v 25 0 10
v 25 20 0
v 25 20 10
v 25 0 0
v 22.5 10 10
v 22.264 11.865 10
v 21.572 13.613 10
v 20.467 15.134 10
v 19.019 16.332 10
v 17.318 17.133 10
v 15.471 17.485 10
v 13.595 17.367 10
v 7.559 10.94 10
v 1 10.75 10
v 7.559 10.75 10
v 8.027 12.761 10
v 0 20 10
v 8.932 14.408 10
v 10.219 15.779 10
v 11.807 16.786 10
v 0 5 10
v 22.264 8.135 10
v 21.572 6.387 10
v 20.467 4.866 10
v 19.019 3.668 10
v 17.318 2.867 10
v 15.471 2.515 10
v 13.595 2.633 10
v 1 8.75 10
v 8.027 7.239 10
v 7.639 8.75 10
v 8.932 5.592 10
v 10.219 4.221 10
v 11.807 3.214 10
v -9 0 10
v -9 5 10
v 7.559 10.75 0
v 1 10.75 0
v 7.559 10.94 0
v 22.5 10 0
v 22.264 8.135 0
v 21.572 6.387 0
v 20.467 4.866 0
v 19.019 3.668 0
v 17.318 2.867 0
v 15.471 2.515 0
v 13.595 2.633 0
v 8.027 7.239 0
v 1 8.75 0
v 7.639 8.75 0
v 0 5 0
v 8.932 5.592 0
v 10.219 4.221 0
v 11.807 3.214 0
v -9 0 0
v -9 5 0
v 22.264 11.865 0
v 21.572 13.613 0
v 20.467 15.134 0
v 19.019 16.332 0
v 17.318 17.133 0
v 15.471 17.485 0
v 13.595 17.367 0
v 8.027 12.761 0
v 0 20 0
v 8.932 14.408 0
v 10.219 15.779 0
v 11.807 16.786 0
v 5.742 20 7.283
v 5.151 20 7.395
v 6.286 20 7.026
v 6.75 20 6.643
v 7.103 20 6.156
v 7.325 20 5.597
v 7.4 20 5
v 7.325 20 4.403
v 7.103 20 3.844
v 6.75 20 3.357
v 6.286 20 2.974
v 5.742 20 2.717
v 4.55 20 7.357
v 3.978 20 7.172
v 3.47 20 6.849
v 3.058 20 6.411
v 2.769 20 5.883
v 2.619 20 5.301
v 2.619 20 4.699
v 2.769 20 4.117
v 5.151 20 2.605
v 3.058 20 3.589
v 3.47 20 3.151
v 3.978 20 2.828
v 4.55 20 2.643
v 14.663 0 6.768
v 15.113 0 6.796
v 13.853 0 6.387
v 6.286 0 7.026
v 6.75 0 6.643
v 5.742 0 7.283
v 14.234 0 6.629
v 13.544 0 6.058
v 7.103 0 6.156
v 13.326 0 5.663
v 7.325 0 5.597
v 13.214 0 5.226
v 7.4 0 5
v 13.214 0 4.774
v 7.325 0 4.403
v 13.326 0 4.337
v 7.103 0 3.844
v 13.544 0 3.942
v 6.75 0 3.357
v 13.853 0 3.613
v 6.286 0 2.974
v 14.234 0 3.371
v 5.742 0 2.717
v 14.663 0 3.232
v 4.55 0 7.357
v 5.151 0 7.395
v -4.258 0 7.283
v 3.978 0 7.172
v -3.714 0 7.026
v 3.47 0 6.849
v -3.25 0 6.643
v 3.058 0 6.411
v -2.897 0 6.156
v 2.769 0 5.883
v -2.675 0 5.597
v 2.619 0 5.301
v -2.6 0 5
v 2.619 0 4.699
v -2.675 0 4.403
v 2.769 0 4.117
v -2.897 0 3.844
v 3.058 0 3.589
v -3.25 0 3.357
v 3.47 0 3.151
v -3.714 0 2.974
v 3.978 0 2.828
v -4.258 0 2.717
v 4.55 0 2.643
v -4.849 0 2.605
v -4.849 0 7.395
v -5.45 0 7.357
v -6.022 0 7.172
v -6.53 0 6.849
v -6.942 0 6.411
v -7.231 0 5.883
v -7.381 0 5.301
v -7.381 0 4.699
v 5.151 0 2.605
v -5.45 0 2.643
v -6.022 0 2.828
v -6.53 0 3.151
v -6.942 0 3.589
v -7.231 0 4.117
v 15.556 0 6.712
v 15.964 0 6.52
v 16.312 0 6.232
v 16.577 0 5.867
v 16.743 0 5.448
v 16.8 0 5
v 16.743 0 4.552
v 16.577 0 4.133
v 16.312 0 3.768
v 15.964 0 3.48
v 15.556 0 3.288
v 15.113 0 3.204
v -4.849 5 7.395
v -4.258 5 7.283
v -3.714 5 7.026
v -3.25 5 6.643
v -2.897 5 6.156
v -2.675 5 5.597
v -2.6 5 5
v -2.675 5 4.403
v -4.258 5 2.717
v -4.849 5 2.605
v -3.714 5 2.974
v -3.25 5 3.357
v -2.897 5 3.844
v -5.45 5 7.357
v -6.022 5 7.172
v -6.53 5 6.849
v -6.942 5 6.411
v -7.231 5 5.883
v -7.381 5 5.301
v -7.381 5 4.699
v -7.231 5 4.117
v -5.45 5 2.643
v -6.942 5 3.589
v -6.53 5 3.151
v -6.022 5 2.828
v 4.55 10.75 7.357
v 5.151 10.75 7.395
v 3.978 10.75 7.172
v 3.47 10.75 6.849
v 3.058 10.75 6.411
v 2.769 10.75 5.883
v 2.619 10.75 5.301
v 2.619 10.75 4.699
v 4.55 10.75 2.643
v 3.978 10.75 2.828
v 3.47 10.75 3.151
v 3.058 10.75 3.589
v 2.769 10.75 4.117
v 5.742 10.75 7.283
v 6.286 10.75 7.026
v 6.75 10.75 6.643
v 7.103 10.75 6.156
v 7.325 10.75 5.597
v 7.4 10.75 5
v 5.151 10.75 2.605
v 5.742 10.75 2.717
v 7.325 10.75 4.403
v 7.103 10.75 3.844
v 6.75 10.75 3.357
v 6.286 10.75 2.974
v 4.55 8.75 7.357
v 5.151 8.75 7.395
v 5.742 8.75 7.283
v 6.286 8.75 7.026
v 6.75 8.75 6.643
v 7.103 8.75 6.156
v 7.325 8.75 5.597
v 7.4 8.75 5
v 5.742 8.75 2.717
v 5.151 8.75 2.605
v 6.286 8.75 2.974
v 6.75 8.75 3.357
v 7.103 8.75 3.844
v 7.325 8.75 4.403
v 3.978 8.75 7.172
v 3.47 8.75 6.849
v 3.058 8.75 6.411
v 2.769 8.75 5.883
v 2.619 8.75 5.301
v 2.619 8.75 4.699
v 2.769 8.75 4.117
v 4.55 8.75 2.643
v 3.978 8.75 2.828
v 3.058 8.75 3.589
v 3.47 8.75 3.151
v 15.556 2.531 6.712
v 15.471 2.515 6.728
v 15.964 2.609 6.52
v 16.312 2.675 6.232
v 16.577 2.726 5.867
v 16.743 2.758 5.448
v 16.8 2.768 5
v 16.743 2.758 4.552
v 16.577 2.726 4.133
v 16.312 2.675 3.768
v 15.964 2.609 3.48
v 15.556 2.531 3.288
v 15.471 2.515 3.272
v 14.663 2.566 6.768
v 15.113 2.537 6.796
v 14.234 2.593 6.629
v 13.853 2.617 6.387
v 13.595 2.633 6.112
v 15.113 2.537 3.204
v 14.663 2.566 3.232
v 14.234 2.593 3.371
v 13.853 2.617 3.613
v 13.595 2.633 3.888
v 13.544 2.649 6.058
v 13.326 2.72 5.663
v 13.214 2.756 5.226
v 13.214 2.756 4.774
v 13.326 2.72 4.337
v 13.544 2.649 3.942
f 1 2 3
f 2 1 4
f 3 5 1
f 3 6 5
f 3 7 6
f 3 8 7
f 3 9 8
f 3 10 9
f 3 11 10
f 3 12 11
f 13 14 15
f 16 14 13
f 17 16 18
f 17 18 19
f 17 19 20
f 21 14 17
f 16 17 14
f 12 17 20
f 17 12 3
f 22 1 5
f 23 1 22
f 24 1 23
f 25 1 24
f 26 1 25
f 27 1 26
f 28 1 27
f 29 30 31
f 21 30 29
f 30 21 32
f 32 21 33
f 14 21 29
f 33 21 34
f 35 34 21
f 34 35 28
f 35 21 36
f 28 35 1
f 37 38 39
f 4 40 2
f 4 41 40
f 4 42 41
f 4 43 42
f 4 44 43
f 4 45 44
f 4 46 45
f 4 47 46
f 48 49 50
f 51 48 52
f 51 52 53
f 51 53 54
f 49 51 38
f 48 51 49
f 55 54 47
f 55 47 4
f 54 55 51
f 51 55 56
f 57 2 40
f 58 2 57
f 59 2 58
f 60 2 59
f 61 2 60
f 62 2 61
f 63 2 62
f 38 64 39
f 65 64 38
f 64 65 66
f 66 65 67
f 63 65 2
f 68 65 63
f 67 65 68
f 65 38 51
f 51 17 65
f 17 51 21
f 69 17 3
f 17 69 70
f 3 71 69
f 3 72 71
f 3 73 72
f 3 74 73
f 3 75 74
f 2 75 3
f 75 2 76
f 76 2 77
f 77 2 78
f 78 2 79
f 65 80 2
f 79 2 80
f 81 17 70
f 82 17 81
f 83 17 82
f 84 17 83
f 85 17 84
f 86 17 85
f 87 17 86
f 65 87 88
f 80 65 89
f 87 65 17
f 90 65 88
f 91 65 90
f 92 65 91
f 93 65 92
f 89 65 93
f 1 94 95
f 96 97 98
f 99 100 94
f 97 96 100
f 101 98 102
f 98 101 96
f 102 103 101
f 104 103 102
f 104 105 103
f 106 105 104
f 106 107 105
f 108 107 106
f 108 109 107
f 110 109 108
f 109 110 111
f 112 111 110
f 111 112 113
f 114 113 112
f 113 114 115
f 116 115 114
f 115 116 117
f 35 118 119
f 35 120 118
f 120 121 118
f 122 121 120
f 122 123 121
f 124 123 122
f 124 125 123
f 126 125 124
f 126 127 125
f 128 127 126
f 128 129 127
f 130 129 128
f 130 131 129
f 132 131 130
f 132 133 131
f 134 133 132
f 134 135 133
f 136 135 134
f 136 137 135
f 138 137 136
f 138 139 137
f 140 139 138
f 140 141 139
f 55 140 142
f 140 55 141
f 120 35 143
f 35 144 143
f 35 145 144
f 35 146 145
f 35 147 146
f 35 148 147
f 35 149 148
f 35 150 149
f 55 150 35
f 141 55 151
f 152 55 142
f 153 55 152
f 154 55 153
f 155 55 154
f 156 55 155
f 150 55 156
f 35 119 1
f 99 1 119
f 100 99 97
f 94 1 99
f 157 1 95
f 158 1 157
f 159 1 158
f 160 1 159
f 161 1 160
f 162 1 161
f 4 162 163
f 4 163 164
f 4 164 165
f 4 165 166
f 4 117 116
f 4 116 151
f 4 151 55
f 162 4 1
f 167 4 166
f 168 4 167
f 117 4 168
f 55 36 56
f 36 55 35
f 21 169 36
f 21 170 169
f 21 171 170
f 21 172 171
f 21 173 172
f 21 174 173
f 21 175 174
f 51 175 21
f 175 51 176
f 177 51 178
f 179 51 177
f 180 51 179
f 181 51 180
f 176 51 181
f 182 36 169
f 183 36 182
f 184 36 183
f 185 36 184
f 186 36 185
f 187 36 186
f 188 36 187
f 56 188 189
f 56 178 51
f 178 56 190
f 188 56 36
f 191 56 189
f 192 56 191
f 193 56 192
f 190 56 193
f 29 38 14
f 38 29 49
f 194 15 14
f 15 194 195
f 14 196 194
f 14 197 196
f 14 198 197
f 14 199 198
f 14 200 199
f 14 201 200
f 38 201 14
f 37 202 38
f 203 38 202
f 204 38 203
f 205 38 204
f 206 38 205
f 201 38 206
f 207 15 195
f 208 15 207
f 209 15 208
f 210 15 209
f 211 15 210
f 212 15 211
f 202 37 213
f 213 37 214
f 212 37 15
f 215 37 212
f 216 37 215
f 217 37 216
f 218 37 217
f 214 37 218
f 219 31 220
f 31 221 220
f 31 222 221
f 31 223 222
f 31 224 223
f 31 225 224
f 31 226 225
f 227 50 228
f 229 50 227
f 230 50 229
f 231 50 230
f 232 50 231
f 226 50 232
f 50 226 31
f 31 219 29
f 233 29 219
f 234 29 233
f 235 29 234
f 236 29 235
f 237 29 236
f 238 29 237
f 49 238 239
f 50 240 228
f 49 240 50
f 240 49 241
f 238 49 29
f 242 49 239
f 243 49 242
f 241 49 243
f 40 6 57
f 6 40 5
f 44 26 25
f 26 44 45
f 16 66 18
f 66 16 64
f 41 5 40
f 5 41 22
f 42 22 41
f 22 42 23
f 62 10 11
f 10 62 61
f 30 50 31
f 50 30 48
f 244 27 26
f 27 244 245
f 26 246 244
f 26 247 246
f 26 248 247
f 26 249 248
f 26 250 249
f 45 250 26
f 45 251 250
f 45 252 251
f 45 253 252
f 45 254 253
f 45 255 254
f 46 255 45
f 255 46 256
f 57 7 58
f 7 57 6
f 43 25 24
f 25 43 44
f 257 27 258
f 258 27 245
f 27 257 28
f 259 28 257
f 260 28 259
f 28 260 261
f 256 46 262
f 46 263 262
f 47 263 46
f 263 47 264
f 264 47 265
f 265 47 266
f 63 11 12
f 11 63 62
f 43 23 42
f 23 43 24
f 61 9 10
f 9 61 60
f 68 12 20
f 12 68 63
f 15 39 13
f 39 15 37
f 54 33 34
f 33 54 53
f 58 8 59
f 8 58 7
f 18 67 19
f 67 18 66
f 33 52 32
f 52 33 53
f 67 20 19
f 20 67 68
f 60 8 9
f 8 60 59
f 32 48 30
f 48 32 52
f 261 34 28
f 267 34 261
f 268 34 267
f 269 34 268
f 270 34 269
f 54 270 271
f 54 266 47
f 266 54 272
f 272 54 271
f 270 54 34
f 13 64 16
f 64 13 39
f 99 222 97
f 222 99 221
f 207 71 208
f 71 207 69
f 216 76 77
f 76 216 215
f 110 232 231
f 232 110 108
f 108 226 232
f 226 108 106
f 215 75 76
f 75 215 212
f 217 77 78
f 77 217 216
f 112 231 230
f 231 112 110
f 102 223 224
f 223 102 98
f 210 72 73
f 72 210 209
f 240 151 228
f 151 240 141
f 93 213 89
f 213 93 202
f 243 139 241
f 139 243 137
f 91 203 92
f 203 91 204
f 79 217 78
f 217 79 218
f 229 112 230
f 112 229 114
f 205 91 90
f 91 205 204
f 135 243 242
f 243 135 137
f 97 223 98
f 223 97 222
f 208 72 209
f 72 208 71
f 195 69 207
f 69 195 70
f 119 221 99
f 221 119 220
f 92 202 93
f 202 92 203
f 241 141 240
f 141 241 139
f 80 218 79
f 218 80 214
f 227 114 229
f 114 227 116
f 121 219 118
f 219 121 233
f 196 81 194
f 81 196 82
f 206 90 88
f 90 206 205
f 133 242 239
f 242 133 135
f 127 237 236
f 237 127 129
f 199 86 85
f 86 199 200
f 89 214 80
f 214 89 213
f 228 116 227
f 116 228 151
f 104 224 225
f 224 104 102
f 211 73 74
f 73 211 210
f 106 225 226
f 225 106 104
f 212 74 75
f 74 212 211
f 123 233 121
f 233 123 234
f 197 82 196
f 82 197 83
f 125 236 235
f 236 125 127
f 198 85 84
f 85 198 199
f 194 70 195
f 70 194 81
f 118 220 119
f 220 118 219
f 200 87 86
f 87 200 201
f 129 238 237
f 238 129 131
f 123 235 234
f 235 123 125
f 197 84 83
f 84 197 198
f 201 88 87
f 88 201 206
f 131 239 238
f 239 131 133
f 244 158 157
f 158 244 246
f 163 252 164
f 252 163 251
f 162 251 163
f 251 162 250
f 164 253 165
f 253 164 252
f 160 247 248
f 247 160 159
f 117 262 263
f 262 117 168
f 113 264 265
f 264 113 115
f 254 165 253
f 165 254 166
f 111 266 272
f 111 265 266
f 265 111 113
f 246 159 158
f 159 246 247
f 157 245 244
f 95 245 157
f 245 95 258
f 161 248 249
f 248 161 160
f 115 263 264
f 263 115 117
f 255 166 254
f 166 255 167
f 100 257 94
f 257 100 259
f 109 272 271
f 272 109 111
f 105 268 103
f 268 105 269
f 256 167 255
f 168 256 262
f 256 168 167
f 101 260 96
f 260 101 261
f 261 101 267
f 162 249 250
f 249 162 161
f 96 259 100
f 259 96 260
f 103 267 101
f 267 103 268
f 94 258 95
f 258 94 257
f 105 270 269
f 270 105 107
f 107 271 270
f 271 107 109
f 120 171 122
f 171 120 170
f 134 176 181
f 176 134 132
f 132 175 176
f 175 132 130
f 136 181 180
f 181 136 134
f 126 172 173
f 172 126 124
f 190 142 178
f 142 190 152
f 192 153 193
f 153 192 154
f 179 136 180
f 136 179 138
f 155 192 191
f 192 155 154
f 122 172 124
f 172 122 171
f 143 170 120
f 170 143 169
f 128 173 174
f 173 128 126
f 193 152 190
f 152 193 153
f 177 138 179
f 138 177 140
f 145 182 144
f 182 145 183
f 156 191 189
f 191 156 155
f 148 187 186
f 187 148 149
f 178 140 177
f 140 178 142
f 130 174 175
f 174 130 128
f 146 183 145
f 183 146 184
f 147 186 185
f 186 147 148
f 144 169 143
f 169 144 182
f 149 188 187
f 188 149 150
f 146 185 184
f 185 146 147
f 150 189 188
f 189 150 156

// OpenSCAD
// assymetric holder for linear bearing D_in=8mm, D_out=15mm, L=25mm.
d_in   =  8.0;   // inner diameter (unused )
d_out  = 15.0;   // outer diameter
L_bear = 25.0;  // bearing length (unused)(Z)

r_out  = d_out / 2 + 0.0;
r_h    = 4.0   / 2 + 0.4;   // mounting hole

x_1 =  5.0;
x_2 = x_1 + 10.0;

//x_w    = 1.5;   // misc walls
y_w    = 2.5;   //
z_w    = 2.0;   //
x_l    = 9.0; // ~~3.5 * r_h;

x_a =  x_2 + r_out + 2.5;
y_a =  d_out + 2 * y_w;
z_a =  10;

x_c = x_a / 2;
y_c = y_a / 2;
z_c = z_a / 2;

dx = x_2 - x_1;

$fn=25;

module lbe_ho_8x25_1side_10mm()
{
  difference() {
    union() {
      cube( [x_a,y_a,z_a] );
      translate([-x_l,0,0]) cube( [x_l,2*y_w,z_a] );
    }
    // place for bearing
    translate([ 1.0,y_c-y_w/2,0]) cube( [dx,2.0,z_a] );
    translate([ x_2,y_w+r_out,0]) cylinder( r=r_out, h=z_a );
    // mounting holes
    translate([ x_1 ,0,z_c]) rotate([-90,0,0])  cylinder( r=r_h, h=y_a );
    translate([ x_1+10 ,0,z_c]) rotate([-90,0,0])  cylinder( r=1.8, h=2*y_w );
    translate([ -5.0,0,z_c]) rotate([-90,0,0])  cylinder( r=r_h, h=2*y_w );
    
  }
}

//translate([ 0,-4,0]) cube( [x_1,1,1] );
lbe_ho_8x25_1side_10mm();
echo( "x_a= ", x_a, "y_a= ", y_a, "z_a= ", z_a );
echo( "x1= ", x_1, "x_2=", x_2, " dx= ", dx, "x_l=", x_l );
